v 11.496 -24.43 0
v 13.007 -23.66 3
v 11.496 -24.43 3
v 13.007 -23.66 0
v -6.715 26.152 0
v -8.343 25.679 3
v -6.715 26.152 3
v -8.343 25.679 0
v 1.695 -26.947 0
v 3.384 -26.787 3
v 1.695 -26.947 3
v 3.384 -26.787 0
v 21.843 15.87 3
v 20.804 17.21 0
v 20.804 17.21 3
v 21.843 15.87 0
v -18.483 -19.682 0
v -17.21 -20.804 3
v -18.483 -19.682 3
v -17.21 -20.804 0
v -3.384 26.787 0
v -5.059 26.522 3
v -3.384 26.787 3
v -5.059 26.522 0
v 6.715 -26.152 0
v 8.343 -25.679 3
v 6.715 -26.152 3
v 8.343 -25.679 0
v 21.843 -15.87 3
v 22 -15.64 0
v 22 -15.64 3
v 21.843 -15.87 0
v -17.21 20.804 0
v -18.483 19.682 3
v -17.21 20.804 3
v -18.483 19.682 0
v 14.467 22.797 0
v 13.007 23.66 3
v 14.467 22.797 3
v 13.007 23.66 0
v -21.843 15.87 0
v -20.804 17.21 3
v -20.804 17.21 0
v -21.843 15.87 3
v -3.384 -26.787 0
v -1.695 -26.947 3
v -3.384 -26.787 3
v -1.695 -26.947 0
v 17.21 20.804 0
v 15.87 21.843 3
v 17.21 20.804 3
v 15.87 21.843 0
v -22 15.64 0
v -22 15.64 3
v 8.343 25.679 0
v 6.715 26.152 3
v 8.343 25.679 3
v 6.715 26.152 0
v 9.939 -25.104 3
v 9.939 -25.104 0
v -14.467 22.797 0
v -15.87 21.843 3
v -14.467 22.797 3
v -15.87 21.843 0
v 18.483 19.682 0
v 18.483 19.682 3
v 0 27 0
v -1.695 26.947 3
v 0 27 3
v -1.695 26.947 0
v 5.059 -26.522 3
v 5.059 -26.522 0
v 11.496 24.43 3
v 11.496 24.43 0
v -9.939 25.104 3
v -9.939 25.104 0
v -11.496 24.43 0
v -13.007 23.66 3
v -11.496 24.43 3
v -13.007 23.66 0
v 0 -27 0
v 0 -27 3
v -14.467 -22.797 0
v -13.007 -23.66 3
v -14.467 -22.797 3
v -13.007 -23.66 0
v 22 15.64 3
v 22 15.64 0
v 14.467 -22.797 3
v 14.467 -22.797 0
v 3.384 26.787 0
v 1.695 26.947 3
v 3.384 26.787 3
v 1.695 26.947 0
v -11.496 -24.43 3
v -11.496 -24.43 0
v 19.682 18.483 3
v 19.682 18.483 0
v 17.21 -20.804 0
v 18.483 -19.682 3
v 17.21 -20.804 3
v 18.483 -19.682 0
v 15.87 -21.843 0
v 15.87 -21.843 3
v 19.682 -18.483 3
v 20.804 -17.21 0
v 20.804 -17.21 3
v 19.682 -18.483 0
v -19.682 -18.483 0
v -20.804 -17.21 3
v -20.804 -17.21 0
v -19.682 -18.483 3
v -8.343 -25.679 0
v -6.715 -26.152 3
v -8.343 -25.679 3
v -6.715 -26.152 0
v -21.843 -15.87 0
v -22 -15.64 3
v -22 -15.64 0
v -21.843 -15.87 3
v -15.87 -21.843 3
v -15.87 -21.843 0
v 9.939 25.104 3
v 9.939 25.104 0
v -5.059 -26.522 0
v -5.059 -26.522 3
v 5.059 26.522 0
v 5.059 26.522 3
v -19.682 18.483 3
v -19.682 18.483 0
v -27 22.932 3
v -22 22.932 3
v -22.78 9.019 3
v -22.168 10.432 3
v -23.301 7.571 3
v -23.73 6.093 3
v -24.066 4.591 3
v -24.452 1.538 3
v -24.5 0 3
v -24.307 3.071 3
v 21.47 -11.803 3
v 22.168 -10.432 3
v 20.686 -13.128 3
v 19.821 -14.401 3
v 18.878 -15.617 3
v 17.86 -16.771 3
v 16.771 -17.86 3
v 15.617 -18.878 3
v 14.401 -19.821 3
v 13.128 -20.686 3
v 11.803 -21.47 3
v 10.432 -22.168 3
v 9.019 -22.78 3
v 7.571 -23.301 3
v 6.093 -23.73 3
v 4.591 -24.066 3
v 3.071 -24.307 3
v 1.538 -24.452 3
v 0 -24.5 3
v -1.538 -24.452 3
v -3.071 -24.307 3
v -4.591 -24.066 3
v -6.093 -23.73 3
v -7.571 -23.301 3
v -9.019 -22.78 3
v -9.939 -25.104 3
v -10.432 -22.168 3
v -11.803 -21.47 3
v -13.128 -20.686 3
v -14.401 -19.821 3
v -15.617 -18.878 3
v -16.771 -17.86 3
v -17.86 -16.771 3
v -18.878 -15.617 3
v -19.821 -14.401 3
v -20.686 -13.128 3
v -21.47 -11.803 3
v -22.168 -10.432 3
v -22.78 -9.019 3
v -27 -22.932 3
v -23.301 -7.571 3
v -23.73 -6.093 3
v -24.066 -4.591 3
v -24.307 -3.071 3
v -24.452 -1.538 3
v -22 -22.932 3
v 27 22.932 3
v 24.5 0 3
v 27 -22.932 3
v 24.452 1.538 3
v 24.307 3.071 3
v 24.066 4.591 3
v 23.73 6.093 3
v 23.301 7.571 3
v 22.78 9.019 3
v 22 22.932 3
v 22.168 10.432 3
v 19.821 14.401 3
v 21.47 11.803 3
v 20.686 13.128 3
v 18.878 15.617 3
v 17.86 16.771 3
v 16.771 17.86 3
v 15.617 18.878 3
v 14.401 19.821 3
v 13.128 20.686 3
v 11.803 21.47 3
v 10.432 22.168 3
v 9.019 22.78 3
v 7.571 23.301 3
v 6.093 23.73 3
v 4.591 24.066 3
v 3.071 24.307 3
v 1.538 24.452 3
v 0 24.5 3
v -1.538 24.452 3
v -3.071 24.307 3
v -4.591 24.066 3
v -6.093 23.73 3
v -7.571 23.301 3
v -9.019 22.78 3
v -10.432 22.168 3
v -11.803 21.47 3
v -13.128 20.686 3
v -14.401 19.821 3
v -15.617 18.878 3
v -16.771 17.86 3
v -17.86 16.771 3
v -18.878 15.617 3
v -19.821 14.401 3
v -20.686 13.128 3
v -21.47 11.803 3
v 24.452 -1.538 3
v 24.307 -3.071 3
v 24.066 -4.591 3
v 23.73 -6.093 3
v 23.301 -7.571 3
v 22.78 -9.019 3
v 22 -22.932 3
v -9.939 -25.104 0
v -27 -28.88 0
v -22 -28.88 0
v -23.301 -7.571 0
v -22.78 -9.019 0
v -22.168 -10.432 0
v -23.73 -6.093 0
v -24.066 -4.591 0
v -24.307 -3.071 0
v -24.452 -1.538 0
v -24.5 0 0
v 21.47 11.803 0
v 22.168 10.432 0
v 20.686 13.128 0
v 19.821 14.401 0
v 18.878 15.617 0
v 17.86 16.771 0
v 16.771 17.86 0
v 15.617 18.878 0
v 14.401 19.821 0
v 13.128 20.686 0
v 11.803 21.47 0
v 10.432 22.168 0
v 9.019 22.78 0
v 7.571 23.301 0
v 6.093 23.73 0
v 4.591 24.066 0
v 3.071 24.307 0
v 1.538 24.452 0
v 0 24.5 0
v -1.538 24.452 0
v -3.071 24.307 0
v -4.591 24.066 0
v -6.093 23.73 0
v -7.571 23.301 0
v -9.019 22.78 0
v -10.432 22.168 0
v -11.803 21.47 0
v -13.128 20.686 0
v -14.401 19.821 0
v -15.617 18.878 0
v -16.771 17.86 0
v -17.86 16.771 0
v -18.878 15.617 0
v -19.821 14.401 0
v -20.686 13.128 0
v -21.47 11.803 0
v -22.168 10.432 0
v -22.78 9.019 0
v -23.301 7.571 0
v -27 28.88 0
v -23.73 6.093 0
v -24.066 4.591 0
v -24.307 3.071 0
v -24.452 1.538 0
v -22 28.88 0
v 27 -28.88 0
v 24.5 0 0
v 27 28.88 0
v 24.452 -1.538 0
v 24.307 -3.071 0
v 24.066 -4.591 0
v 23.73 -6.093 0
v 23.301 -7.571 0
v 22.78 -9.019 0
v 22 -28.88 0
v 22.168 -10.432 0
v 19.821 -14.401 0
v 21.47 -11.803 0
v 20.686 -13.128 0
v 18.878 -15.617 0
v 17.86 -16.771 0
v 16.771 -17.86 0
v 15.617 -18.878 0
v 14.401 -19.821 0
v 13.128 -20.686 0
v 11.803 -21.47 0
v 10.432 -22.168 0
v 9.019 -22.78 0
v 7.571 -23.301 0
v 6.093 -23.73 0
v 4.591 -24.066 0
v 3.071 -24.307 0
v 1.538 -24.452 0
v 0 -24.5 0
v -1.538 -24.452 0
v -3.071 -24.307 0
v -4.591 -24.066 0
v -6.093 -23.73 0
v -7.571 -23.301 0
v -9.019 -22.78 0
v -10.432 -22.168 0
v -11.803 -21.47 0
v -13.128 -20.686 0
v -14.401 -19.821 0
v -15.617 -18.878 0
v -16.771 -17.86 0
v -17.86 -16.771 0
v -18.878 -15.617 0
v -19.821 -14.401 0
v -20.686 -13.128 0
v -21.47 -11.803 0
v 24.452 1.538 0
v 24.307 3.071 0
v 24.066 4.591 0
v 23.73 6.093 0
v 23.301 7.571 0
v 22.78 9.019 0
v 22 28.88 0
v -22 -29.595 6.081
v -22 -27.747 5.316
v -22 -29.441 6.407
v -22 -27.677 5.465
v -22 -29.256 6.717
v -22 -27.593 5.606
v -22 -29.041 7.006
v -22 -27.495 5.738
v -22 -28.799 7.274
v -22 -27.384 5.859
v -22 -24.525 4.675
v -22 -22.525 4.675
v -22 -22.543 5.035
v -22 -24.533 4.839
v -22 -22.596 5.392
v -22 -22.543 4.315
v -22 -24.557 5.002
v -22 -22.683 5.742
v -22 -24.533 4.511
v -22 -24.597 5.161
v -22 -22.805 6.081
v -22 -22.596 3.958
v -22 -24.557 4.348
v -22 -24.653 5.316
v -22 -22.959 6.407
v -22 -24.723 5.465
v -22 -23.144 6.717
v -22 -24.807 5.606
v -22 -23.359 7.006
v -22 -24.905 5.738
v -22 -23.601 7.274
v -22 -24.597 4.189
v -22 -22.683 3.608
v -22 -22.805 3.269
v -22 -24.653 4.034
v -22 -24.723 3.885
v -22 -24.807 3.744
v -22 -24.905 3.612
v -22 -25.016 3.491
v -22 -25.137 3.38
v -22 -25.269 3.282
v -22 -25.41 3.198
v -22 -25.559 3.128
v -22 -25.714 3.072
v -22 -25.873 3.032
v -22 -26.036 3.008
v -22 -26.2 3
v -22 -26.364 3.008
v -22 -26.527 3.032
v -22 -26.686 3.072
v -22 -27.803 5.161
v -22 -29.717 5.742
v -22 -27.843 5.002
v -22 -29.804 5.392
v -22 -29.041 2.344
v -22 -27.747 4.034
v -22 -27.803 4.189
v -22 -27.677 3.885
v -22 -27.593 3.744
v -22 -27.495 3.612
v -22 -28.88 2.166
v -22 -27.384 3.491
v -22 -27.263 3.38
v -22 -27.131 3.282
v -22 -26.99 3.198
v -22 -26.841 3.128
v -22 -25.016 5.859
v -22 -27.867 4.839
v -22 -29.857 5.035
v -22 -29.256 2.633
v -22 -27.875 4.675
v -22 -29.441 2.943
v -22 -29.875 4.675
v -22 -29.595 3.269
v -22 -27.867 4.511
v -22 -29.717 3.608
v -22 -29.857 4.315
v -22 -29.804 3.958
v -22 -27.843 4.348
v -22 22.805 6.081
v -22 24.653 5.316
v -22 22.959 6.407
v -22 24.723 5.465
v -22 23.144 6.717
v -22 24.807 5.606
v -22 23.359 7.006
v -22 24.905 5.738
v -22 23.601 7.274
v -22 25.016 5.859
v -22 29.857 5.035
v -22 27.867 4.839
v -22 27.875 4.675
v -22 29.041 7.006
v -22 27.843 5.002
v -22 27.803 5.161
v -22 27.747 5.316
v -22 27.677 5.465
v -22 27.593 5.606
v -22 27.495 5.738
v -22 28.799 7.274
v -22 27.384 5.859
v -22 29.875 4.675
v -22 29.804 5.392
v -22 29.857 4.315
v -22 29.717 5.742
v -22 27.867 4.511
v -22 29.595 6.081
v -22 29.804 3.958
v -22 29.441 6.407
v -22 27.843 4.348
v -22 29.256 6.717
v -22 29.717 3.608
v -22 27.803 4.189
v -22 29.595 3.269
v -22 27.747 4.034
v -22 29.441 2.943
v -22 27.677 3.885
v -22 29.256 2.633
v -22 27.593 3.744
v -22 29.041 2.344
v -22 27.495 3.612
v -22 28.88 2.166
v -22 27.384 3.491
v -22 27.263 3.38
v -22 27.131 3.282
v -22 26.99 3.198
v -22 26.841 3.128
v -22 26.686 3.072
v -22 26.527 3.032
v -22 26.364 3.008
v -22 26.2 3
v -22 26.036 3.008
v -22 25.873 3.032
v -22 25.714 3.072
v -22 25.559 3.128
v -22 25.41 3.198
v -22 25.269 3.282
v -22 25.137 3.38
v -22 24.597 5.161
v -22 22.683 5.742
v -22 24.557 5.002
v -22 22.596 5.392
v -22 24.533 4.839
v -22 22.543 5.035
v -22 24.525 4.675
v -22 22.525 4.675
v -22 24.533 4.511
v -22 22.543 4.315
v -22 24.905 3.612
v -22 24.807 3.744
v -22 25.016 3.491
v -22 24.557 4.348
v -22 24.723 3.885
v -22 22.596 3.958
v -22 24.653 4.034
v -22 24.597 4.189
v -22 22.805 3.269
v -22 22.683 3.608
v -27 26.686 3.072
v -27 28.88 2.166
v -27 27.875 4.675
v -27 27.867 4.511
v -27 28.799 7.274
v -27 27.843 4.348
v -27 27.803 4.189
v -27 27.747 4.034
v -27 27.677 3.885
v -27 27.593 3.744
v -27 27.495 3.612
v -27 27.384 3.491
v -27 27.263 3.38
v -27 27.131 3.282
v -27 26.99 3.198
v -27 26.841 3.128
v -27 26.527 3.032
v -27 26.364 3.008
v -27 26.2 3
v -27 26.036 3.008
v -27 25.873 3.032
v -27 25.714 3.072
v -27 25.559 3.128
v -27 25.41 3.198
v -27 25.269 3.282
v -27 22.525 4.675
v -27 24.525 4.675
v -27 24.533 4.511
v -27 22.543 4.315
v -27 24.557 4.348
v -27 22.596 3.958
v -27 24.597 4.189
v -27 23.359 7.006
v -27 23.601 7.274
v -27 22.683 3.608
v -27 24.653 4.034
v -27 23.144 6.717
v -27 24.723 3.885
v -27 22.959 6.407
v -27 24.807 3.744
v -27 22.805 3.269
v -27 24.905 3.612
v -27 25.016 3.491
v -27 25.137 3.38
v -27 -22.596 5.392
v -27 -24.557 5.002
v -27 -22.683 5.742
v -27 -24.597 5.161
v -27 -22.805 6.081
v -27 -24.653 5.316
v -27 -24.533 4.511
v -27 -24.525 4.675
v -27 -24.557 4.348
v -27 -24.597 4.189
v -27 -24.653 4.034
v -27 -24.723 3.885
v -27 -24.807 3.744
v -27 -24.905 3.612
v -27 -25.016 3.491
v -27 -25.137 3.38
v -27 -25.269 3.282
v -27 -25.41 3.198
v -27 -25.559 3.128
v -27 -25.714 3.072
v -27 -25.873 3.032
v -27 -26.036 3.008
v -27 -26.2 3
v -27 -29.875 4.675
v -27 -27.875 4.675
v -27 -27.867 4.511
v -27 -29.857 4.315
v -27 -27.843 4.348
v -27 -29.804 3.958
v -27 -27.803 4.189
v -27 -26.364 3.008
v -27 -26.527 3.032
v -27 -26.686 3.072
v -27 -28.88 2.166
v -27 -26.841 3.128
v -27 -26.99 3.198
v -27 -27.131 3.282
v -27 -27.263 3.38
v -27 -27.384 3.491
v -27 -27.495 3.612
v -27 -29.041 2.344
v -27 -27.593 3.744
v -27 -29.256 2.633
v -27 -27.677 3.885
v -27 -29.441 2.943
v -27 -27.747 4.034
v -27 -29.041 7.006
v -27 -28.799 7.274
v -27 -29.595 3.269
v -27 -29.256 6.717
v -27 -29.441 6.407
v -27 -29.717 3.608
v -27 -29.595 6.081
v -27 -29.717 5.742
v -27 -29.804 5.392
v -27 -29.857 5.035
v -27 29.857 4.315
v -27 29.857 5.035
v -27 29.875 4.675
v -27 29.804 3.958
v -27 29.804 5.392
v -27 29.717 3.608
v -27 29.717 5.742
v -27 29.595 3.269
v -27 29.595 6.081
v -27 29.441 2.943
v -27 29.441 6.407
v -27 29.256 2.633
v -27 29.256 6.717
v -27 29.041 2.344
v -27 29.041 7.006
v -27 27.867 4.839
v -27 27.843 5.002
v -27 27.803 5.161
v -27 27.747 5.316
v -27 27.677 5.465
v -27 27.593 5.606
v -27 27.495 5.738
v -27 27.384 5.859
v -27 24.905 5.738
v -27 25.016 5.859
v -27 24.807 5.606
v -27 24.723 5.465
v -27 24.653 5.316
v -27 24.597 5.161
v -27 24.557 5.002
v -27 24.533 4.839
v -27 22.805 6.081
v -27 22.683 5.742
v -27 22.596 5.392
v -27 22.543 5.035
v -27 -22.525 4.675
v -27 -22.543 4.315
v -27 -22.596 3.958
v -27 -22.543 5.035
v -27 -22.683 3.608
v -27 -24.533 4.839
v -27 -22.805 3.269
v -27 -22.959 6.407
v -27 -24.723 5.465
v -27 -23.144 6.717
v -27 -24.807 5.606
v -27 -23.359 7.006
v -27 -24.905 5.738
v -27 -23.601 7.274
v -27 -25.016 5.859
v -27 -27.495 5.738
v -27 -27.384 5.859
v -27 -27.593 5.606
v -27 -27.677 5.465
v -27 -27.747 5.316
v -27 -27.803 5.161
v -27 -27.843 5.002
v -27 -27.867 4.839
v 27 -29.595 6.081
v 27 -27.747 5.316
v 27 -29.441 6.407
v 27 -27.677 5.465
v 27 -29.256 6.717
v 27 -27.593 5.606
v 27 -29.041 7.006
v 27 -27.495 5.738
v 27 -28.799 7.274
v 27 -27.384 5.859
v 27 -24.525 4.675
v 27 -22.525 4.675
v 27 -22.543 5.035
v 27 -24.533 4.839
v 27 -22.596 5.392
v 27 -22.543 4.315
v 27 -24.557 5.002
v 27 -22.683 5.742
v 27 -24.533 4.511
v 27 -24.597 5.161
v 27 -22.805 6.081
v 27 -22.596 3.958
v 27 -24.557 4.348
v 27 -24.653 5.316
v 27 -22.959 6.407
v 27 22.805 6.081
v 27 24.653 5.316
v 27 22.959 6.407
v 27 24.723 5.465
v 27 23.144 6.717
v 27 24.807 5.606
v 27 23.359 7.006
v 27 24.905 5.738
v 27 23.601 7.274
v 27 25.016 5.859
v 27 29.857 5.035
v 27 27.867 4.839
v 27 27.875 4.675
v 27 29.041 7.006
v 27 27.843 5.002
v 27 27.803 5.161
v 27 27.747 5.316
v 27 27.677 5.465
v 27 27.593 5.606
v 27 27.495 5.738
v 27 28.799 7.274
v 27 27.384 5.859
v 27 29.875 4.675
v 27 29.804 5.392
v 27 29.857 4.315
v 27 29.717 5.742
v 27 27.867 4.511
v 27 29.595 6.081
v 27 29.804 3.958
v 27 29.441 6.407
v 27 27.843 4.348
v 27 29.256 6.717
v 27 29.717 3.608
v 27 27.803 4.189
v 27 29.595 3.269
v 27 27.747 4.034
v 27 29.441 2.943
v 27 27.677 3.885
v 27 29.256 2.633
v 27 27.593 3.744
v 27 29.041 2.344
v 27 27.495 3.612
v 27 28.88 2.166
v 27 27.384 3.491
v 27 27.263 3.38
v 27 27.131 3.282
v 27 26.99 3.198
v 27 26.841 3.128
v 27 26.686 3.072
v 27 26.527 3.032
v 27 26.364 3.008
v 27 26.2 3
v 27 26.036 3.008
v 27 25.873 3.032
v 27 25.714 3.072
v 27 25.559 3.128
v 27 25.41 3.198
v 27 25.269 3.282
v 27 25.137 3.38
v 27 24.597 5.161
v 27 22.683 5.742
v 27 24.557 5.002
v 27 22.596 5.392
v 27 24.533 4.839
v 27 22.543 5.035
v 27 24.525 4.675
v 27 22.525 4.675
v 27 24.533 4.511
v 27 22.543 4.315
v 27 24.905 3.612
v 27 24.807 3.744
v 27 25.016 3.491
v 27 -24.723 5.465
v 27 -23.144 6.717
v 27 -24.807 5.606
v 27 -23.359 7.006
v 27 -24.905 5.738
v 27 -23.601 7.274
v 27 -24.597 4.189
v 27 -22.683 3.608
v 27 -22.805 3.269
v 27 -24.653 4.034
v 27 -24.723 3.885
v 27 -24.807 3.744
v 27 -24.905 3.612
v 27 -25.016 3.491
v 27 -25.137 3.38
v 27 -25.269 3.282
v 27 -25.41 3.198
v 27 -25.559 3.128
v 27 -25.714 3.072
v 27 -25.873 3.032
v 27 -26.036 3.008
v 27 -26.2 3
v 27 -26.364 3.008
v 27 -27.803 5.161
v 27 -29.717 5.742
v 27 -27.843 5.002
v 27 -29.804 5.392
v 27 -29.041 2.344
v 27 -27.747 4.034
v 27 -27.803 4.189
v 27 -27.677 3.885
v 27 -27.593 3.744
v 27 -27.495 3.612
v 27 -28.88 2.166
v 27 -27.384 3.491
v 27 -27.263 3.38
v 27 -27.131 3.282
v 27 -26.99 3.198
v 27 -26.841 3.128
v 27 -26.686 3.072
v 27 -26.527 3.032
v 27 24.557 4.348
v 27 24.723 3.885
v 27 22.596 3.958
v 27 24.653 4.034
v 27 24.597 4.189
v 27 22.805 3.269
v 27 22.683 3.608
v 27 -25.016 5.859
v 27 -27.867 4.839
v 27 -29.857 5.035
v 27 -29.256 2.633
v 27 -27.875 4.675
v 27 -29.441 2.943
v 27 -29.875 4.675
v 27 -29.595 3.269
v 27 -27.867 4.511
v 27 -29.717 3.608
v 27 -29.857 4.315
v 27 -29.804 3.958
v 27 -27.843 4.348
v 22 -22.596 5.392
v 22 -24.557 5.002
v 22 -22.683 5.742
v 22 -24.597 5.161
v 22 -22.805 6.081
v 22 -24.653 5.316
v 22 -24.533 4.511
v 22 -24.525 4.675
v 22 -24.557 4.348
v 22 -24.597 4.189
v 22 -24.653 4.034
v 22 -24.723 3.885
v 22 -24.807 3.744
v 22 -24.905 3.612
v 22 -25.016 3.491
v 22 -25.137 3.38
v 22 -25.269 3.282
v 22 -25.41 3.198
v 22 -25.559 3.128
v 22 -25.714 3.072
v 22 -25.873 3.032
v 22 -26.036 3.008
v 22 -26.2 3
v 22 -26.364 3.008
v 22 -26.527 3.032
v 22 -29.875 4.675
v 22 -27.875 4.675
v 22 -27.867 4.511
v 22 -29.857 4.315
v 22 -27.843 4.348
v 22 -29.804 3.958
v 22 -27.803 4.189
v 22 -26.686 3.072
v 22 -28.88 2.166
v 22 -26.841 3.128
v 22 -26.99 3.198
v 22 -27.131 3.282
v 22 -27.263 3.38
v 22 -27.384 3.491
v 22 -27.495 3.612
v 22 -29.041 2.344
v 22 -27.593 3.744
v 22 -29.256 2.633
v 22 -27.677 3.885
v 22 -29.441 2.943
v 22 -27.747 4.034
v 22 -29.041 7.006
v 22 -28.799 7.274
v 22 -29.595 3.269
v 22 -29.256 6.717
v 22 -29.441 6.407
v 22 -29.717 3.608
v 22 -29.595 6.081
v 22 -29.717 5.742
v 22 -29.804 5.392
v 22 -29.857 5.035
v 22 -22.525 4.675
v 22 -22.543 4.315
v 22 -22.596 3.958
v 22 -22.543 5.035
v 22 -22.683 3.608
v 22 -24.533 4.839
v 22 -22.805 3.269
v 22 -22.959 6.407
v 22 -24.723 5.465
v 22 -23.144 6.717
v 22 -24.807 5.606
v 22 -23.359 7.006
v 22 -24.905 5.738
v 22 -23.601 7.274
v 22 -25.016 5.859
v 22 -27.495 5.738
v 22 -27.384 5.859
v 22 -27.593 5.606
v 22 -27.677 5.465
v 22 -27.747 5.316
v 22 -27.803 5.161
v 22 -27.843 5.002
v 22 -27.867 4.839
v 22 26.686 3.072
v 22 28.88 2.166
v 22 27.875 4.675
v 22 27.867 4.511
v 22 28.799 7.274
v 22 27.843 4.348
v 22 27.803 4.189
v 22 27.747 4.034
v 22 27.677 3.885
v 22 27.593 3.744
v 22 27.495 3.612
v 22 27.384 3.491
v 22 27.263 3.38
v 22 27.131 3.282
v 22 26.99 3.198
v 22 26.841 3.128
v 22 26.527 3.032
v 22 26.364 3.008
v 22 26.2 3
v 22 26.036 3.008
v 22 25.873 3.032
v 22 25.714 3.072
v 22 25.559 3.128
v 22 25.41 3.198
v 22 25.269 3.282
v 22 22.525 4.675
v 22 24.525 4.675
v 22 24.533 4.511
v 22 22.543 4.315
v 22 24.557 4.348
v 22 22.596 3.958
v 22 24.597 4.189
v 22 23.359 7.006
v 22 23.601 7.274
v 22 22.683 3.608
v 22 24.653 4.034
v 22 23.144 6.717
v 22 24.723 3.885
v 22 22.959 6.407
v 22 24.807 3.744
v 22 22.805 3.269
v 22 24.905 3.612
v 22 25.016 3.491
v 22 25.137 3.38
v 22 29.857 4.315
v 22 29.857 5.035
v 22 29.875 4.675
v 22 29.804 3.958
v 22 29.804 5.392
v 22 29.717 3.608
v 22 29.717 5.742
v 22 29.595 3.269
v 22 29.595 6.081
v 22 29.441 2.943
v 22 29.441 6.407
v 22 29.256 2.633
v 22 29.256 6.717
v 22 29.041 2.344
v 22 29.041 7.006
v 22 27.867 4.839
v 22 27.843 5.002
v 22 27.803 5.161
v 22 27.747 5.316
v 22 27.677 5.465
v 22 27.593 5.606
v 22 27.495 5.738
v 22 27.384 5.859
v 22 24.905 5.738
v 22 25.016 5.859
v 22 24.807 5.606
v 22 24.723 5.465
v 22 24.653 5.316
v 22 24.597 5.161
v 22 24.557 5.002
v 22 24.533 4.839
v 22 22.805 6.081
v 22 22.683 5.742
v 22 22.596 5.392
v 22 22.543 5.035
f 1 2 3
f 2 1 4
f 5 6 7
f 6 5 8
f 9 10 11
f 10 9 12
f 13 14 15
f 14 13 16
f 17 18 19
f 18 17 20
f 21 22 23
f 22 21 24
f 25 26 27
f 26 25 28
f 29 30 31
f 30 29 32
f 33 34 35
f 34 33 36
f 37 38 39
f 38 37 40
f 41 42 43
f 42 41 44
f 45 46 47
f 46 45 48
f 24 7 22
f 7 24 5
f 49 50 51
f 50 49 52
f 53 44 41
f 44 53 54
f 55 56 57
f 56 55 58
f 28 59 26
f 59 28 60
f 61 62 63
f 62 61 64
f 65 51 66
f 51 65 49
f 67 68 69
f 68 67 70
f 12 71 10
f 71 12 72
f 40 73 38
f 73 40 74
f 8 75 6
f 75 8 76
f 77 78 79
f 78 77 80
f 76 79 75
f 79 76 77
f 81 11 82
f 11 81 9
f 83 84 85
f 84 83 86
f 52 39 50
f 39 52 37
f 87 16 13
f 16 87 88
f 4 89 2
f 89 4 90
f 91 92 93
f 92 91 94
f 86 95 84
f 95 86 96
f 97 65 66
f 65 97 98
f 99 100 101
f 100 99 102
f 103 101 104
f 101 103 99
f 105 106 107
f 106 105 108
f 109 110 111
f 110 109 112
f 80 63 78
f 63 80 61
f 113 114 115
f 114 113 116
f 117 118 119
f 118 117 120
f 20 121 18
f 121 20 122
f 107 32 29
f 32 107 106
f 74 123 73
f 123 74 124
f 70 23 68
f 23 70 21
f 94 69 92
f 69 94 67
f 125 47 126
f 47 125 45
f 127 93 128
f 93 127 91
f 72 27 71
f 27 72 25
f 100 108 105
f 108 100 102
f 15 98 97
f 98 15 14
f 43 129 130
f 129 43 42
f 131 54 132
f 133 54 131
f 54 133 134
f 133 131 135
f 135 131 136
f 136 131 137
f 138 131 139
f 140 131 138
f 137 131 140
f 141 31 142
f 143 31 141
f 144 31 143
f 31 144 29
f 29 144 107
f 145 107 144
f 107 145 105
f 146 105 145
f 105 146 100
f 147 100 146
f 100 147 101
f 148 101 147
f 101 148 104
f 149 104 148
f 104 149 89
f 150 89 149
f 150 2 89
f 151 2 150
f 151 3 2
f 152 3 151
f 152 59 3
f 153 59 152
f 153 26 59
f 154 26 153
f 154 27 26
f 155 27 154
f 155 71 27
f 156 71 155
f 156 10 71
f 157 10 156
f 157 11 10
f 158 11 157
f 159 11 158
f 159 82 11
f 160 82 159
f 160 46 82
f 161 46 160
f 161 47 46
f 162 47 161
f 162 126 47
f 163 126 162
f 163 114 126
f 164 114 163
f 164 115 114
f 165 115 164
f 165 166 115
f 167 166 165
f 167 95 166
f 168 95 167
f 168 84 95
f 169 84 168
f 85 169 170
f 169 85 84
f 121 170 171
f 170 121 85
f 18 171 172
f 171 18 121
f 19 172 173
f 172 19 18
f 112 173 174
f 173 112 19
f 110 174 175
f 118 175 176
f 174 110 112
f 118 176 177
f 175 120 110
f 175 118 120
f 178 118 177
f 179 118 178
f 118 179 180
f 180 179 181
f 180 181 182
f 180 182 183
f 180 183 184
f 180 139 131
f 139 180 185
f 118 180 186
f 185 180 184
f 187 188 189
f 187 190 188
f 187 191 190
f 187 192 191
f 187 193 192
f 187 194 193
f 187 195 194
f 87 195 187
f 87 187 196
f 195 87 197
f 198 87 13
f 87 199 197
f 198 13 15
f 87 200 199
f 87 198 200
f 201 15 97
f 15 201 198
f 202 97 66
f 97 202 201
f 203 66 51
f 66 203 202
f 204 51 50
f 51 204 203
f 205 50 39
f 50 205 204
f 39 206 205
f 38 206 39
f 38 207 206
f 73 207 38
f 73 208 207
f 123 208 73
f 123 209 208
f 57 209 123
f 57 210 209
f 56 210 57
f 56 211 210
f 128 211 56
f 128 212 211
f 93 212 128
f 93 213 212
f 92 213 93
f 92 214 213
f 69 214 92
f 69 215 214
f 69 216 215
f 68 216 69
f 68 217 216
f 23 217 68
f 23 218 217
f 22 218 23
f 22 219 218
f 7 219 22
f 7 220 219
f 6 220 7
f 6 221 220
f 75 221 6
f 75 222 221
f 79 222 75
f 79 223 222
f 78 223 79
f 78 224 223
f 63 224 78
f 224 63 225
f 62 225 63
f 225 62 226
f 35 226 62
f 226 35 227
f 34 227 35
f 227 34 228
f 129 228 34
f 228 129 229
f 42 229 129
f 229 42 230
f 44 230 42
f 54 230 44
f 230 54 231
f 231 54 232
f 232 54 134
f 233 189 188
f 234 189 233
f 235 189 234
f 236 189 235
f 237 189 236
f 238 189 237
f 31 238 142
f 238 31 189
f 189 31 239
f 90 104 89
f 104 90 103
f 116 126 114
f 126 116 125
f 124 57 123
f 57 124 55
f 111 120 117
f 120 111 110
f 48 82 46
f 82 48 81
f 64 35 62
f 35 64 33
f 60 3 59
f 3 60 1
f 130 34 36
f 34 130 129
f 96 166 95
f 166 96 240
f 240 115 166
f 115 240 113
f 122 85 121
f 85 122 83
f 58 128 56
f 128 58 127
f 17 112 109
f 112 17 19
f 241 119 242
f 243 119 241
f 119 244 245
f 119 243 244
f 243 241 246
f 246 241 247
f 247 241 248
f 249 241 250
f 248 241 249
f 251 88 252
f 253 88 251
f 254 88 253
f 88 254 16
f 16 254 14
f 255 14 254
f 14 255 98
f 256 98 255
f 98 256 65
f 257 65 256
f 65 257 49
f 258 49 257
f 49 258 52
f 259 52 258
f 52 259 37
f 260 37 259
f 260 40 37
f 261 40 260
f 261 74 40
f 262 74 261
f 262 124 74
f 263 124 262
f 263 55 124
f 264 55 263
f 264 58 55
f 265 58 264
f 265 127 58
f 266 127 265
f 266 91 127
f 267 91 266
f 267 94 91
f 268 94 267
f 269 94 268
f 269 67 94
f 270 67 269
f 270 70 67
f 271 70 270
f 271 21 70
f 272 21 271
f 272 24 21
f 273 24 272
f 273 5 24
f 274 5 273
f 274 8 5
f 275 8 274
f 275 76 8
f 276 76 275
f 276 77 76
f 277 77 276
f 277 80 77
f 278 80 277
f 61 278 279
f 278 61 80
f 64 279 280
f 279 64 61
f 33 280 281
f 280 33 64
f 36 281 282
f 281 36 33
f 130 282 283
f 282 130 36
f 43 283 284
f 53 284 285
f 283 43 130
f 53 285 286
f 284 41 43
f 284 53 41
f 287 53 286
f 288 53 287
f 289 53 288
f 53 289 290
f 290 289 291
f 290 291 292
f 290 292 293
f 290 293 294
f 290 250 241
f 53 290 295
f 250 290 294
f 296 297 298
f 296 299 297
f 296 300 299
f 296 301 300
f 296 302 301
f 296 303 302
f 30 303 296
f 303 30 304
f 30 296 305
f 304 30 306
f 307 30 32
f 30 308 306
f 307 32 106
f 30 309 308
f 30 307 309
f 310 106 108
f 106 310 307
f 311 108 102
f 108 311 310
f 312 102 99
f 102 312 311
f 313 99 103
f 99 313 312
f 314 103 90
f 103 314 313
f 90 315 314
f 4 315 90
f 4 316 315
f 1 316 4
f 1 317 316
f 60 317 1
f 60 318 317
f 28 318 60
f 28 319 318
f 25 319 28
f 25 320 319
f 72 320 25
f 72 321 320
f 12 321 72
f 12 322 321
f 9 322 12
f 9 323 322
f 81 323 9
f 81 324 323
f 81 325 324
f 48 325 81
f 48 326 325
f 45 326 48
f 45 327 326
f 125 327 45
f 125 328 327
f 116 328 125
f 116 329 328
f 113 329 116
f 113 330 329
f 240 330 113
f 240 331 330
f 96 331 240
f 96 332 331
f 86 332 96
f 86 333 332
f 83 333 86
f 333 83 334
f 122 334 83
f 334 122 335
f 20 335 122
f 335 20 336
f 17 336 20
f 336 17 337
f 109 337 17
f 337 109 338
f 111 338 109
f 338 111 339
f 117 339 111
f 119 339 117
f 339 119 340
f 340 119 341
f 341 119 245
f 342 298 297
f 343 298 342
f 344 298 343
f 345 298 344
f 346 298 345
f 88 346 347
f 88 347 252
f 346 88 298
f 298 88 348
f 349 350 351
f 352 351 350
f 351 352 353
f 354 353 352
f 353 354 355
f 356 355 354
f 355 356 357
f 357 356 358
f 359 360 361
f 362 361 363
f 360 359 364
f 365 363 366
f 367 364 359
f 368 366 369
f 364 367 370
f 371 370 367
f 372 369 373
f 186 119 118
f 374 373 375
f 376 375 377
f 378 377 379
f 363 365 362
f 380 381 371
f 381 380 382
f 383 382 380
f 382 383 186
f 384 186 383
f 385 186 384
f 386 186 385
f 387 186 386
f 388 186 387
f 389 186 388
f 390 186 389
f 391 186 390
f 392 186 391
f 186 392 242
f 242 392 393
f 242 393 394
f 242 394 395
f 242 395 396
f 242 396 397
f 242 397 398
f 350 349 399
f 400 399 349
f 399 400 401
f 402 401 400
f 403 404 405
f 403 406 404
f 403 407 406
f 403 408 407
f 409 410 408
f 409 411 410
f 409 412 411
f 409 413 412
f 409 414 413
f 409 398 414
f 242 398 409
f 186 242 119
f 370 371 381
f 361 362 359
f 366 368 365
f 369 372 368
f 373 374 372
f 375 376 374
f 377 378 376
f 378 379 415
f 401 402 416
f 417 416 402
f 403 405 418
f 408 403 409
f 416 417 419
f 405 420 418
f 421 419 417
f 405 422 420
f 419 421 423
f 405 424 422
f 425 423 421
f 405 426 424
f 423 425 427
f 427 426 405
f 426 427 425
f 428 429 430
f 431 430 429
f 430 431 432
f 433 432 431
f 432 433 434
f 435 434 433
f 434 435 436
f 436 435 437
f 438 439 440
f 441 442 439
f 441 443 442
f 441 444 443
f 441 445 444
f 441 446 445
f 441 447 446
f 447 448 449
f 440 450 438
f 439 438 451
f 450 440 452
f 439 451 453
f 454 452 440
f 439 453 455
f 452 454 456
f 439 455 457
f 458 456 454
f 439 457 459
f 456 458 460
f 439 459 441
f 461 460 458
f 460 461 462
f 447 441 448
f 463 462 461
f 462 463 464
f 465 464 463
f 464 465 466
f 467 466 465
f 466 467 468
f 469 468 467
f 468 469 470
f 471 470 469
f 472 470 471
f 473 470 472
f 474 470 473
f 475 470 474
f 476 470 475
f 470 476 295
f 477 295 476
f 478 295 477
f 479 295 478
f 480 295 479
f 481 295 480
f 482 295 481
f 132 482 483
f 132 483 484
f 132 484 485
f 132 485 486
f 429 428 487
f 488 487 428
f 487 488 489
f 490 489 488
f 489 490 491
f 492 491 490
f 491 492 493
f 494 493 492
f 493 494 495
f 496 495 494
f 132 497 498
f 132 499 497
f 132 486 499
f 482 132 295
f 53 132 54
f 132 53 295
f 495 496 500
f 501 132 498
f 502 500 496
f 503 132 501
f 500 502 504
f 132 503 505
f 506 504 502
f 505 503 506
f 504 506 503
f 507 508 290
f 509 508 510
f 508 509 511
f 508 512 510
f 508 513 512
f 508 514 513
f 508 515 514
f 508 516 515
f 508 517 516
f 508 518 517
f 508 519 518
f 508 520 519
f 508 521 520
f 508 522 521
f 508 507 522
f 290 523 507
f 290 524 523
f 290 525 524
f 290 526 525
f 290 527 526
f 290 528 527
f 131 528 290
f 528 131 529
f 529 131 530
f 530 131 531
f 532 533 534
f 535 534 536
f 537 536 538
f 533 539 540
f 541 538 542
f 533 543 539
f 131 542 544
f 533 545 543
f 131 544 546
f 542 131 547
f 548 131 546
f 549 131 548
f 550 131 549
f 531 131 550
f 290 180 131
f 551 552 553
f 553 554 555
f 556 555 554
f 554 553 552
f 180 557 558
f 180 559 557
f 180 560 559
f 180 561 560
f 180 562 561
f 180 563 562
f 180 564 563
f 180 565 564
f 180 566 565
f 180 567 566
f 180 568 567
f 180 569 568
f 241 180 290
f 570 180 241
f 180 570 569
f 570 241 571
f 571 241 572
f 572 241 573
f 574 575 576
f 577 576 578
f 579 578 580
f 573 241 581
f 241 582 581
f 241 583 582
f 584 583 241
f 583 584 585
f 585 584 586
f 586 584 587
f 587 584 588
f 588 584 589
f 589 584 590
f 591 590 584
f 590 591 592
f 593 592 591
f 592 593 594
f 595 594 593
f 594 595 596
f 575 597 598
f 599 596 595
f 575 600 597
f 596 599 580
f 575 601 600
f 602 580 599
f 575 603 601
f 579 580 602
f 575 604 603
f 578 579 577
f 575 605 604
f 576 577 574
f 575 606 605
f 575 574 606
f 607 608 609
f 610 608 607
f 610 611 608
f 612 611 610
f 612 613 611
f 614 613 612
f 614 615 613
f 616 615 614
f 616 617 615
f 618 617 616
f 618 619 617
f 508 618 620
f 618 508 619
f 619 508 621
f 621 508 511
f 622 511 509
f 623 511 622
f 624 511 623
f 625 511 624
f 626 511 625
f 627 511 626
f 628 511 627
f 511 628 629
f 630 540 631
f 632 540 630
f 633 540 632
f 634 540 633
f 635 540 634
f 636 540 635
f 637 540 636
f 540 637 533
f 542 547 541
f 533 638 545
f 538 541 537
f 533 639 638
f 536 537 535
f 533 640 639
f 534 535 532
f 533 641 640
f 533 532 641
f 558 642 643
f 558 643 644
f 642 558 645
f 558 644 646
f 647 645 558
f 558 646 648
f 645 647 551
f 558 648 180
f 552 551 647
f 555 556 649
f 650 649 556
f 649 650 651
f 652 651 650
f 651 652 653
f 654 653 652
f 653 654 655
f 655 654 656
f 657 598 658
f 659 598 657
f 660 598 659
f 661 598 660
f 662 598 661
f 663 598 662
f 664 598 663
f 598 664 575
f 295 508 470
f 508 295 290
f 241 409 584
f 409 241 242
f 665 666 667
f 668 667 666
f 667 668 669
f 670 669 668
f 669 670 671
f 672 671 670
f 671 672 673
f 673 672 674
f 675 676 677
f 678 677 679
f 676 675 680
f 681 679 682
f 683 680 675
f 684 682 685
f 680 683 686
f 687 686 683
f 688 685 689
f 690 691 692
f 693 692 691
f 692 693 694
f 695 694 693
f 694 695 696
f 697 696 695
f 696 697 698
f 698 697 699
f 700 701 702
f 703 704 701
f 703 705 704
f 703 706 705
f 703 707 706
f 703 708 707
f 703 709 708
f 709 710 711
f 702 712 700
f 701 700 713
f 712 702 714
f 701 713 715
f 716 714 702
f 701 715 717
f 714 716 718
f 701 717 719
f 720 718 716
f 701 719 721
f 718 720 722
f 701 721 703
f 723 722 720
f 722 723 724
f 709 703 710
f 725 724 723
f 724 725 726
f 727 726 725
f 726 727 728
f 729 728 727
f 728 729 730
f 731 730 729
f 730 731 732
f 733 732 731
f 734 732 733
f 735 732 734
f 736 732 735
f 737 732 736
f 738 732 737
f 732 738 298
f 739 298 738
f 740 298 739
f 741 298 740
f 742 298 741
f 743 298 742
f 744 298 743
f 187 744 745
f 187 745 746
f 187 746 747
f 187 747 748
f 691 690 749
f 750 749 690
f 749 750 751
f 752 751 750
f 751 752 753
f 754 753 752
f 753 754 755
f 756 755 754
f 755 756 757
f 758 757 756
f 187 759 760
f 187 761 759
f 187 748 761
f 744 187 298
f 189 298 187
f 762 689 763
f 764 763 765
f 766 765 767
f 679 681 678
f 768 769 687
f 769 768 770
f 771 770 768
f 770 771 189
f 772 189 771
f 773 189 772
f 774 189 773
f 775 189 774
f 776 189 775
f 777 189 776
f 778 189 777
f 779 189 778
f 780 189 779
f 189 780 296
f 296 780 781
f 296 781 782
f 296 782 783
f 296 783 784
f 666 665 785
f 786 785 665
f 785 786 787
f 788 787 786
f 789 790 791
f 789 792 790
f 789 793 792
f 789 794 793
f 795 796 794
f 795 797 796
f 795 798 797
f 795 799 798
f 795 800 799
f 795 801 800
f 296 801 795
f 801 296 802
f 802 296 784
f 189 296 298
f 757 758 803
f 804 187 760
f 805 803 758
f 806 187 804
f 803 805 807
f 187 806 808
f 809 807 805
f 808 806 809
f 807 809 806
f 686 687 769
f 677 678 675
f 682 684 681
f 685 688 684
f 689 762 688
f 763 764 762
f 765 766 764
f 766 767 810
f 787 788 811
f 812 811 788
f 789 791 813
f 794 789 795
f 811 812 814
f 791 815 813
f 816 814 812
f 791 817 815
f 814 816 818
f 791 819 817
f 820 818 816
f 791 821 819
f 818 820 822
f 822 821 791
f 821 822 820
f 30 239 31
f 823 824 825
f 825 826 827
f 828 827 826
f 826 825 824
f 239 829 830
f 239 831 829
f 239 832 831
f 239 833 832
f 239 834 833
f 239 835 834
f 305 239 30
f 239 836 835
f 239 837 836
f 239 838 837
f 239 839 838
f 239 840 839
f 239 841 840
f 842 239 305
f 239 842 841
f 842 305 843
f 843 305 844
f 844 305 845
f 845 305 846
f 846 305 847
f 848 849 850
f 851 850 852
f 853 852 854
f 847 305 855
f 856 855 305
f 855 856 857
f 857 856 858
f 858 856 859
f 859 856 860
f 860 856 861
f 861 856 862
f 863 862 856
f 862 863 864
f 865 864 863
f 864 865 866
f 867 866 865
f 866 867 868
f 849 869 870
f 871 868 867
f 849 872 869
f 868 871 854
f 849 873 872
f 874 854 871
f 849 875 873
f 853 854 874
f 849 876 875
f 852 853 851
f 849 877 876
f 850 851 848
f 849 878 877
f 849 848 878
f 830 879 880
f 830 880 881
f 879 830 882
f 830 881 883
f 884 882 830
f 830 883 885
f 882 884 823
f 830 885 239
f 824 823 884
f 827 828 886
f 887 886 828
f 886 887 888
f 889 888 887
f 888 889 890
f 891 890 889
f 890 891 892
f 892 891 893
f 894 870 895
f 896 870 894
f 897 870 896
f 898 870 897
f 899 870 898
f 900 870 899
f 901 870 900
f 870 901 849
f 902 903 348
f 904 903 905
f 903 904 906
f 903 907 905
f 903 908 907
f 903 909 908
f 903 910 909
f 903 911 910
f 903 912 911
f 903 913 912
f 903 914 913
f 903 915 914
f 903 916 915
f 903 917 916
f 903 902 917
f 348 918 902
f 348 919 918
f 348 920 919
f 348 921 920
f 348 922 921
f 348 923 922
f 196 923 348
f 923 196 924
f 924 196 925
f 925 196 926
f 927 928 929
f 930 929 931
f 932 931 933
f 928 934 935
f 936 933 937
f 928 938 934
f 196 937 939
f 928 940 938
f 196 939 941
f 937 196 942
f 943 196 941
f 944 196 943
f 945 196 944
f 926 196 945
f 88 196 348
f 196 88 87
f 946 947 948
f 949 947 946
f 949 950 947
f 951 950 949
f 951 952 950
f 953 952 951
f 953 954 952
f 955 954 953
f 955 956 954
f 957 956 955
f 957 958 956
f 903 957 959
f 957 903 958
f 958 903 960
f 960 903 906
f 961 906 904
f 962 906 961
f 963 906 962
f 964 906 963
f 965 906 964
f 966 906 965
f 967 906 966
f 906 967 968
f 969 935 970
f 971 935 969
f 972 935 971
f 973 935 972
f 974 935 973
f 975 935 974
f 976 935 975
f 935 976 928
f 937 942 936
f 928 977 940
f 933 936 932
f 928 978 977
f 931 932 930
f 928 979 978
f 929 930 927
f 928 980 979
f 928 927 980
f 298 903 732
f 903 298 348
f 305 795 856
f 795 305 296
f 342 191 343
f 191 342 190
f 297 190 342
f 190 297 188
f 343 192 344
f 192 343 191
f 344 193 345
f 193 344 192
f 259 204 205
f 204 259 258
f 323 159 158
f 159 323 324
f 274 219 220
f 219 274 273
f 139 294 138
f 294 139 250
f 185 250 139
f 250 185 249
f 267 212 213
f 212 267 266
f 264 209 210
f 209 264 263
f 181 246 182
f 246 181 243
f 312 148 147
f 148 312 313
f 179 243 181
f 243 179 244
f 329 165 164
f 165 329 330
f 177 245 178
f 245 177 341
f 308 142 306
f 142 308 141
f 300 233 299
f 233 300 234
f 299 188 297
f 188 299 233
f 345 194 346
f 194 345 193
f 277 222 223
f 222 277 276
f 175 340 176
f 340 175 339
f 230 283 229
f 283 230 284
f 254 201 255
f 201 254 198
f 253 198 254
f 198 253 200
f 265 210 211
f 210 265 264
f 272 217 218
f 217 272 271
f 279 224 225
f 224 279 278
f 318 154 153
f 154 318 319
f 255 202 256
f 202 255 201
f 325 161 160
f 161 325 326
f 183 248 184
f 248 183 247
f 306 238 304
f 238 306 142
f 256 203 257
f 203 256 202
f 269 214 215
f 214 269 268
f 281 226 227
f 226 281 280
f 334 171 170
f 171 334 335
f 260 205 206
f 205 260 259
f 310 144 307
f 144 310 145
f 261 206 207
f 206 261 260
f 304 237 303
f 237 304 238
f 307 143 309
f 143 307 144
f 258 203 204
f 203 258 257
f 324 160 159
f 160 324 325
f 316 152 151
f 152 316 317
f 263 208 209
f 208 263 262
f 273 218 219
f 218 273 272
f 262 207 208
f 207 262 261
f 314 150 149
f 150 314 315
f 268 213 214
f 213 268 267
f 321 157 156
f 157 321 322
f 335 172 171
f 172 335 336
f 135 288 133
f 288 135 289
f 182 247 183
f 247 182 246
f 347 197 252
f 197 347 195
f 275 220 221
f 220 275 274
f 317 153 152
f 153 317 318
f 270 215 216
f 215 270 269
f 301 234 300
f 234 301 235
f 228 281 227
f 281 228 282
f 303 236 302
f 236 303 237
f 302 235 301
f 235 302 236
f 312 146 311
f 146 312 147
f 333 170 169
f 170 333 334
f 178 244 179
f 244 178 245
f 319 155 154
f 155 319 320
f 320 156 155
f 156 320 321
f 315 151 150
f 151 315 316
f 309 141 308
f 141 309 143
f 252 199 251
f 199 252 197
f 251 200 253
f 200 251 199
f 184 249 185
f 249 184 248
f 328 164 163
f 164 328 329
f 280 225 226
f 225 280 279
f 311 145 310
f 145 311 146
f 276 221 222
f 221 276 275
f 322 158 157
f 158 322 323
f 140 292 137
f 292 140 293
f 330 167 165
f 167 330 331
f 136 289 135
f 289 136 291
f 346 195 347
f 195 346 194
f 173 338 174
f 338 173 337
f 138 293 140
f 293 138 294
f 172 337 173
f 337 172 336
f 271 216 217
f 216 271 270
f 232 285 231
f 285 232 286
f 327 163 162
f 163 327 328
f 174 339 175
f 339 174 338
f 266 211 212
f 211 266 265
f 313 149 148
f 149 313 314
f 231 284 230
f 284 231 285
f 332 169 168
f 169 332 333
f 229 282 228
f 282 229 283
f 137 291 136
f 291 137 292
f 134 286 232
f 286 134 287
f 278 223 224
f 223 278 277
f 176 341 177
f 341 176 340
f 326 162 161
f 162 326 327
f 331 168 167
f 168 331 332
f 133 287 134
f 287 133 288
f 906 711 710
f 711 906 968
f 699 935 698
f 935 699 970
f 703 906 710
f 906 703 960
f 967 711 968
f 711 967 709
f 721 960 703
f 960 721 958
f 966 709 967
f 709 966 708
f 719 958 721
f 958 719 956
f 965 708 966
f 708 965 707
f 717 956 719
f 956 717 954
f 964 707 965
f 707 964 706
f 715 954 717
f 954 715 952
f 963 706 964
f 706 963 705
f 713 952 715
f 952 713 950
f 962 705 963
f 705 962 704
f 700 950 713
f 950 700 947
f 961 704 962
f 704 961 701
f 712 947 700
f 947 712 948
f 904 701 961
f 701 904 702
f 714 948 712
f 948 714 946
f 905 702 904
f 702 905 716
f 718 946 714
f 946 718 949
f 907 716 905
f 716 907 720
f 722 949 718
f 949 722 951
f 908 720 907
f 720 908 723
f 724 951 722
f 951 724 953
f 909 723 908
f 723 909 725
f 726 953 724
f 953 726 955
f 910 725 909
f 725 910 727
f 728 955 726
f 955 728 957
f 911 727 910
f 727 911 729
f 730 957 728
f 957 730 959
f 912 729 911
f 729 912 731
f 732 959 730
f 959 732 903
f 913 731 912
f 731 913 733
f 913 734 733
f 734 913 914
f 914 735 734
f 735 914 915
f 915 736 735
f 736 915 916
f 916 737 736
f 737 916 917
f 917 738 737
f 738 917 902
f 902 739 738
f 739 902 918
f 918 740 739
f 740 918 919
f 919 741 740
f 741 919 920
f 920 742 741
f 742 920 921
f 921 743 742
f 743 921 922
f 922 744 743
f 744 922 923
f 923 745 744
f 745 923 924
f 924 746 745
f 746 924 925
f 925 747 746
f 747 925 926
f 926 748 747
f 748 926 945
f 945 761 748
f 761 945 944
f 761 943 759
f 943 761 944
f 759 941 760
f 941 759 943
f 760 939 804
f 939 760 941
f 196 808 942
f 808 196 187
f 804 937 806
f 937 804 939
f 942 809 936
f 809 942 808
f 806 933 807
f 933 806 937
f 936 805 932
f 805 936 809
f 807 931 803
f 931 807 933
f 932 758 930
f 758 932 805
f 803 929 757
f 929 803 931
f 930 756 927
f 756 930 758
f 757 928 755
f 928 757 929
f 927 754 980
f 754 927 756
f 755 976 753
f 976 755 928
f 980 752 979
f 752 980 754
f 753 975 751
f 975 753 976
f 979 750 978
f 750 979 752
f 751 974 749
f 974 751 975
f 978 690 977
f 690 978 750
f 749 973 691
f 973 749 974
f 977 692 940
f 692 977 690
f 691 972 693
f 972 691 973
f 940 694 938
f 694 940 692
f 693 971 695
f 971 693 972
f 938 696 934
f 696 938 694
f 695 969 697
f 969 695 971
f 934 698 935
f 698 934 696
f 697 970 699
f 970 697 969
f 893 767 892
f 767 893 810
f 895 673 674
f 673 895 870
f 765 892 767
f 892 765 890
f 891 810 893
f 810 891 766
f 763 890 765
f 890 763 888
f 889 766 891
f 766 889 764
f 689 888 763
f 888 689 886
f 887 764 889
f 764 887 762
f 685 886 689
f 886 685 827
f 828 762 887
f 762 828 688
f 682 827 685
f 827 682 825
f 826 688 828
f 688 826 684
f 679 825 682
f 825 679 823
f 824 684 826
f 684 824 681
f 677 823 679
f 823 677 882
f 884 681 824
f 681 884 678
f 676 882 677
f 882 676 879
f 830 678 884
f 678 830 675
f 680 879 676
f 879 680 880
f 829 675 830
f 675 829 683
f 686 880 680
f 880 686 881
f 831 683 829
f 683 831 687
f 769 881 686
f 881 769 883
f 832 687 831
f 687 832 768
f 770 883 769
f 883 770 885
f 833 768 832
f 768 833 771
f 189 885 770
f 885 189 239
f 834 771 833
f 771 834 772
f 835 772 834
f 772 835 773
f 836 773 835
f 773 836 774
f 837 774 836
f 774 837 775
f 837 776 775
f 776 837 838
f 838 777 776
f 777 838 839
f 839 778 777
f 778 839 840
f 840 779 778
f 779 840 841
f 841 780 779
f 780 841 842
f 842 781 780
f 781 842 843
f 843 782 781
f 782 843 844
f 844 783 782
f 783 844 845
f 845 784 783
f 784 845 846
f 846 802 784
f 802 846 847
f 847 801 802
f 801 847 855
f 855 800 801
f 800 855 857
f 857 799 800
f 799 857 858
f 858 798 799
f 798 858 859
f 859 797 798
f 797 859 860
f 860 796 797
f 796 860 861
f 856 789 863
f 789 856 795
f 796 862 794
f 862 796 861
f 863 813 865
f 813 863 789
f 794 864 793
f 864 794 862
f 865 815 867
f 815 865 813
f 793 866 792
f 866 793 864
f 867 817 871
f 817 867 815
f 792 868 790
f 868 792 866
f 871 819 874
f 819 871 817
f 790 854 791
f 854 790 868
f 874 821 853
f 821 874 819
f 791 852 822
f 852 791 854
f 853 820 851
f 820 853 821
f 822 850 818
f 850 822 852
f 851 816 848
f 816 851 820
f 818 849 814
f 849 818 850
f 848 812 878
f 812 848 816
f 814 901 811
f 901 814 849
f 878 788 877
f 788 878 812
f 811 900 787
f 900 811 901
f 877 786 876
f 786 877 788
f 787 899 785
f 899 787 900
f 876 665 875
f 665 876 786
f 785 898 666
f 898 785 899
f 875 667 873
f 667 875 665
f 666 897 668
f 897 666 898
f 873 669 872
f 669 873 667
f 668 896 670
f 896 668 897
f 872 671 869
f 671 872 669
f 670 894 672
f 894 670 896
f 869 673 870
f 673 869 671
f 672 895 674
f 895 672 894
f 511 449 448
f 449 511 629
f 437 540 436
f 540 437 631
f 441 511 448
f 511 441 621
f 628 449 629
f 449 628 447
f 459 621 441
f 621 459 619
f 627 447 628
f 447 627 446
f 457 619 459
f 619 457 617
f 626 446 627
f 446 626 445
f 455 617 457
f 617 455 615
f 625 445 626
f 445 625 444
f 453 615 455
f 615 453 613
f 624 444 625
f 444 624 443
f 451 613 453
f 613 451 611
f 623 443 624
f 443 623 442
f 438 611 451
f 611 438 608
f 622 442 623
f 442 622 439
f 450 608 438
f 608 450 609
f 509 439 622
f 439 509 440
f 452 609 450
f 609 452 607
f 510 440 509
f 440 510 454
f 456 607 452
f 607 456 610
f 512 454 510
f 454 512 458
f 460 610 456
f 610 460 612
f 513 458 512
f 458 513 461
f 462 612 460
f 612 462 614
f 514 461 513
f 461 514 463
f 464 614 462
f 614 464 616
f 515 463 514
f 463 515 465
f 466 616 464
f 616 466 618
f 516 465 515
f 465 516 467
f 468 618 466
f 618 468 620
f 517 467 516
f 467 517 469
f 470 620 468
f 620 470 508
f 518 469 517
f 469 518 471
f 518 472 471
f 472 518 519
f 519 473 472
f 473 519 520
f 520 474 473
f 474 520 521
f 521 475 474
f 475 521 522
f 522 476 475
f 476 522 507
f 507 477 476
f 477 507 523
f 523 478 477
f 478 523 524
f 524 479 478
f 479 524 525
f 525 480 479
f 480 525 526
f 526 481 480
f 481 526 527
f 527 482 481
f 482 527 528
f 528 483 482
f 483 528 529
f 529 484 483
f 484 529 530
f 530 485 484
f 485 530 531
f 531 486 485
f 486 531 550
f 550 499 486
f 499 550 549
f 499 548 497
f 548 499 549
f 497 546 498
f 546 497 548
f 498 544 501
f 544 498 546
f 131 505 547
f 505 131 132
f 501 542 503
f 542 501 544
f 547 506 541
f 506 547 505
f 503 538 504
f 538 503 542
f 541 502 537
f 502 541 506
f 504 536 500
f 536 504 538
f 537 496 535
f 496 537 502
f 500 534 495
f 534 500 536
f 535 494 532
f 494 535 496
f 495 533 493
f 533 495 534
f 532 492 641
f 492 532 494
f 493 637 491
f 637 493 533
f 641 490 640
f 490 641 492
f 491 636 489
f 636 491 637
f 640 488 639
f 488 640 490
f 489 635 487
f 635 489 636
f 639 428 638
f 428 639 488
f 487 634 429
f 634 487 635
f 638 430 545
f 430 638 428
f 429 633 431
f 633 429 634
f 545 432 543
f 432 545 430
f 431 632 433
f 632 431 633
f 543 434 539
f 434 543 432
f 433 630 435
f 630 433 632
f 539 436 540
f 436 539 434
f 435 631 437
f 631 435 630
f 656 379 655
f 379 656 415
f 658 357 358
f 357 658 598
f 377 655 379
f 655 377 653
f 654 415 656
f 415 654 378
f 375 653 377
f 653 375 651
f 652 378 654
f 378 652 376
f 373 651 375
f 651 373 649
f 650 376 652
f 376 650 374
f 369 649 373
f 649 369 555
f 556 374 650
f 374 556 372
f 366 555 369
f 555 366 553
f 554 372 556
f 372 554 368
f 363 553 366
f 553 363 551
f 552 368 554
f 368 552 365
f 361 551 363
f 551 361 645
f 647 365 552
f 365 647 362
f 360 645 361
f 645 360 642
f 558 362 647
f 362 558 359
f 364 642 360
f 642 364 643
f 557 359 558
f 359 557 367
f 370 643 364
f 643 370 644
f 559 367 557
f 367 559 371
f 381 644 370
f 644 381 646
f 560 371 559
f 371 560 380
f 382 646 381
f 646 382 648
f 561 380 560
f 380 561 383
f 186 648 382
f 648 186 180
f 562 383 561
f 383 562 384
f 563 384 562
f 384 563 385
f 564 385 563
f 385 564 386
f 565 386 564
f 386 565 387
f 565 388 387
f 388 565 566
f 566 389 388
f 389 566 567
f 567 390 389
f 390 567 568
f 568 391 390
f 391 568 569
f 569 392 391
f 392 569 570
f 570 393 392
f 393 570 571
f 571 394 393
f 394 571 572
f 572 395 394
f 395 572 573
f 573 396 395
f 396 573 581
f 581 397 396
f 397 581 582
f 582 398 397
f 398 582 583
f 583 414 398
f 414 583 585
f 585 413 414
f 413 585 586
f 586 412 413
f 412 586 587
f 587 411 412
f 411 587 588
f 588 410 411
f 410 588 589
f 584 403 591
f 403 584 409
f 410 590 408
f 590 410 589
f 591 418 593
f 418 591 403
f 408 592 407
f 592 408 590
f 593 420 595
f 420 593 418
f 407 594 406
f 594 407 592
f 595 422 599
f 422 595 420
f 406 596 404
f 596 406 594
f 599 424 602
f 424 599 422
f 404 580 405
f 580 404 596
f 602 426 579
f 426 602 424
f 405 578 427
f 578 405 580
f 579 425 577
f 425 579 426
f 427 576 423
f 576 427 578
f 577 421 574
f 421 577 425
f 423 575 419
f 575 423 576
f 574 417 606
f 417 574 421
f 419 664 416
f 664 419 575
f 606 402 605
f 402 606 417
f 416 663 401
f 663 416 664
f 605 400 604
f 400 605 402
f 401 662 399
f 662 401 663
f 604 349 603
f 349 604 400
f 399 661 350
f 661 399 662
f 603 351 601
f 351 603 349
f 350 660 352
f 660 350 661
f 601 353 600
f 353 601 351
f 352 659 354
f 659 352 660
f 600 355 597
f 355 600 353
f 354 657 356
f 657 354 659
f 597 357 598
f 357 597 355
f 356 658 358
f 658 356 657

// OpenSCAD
l_base = 54;

a_paredes = 3;
l_paredes = 3;

l_braco = 5;


d_gancho = 3.35;
l_gancho = l_braco;
p_gancho = 4;
a_gancho = 270;

module gancho() {
    rotate( -90, [ 0, 1, 0 ] )
    rotate( ( 360 - a_gancho ) / 2, [ 0, 0, 1 ] )
        rotate_extrude( angle = a_gancho, $fn = 64 )
            translate( [ d_gancho / 2, 0 ] )
                square( [ p_gancho / 2, l_gancho ] );
}

del_gancho = 0.8;

translate( [ l_base / 2, l_base / 2 - del_gancho, d_gancho / 2 + a_paredes ] )
    gancho();
translate( [ l_base / 2, -l_base / 2 + del_gancho, d_gancho / 2 + a_paredes ] )
    gancho();
translate( [ -l_base / 2 + l_gancho, l_base / 2 - del_gancho, d_gancho / 2 + a_paredes ] )
    gancho();
translate( [ -l_base / 2 + l_gancho, -l_base / 2 + del_gancho, d_gancho / 2 + a_paredes ] )
    gancho();

difference()
{
    union(){
        cylinder( d = l_base, h = a_paredes, $fn = 100 );
        translate( [ -l_base / 2, -l_base / 2 - d_gancho * 0.8 + del_gancho, 0 ] )
            cube( [ l_braco, l_base + d_gancho * 1.6 - 2 * del_gancho, a_paredes ] );
        translate( [ l_base / 2 - l_braco, -l_base / 2 - d_gancho * 0.8 + del_gancho, 0 ] )
            cube( [ l_braco, l_base + d_gancho * 1.6 - 2 * del_gancho, a_paredes ] );
    }
    translate( [ 0, 0, -1 ] )
        cylinder( d = l_base - 5, h = a_paredes + 2, $fn = 100 );
}
